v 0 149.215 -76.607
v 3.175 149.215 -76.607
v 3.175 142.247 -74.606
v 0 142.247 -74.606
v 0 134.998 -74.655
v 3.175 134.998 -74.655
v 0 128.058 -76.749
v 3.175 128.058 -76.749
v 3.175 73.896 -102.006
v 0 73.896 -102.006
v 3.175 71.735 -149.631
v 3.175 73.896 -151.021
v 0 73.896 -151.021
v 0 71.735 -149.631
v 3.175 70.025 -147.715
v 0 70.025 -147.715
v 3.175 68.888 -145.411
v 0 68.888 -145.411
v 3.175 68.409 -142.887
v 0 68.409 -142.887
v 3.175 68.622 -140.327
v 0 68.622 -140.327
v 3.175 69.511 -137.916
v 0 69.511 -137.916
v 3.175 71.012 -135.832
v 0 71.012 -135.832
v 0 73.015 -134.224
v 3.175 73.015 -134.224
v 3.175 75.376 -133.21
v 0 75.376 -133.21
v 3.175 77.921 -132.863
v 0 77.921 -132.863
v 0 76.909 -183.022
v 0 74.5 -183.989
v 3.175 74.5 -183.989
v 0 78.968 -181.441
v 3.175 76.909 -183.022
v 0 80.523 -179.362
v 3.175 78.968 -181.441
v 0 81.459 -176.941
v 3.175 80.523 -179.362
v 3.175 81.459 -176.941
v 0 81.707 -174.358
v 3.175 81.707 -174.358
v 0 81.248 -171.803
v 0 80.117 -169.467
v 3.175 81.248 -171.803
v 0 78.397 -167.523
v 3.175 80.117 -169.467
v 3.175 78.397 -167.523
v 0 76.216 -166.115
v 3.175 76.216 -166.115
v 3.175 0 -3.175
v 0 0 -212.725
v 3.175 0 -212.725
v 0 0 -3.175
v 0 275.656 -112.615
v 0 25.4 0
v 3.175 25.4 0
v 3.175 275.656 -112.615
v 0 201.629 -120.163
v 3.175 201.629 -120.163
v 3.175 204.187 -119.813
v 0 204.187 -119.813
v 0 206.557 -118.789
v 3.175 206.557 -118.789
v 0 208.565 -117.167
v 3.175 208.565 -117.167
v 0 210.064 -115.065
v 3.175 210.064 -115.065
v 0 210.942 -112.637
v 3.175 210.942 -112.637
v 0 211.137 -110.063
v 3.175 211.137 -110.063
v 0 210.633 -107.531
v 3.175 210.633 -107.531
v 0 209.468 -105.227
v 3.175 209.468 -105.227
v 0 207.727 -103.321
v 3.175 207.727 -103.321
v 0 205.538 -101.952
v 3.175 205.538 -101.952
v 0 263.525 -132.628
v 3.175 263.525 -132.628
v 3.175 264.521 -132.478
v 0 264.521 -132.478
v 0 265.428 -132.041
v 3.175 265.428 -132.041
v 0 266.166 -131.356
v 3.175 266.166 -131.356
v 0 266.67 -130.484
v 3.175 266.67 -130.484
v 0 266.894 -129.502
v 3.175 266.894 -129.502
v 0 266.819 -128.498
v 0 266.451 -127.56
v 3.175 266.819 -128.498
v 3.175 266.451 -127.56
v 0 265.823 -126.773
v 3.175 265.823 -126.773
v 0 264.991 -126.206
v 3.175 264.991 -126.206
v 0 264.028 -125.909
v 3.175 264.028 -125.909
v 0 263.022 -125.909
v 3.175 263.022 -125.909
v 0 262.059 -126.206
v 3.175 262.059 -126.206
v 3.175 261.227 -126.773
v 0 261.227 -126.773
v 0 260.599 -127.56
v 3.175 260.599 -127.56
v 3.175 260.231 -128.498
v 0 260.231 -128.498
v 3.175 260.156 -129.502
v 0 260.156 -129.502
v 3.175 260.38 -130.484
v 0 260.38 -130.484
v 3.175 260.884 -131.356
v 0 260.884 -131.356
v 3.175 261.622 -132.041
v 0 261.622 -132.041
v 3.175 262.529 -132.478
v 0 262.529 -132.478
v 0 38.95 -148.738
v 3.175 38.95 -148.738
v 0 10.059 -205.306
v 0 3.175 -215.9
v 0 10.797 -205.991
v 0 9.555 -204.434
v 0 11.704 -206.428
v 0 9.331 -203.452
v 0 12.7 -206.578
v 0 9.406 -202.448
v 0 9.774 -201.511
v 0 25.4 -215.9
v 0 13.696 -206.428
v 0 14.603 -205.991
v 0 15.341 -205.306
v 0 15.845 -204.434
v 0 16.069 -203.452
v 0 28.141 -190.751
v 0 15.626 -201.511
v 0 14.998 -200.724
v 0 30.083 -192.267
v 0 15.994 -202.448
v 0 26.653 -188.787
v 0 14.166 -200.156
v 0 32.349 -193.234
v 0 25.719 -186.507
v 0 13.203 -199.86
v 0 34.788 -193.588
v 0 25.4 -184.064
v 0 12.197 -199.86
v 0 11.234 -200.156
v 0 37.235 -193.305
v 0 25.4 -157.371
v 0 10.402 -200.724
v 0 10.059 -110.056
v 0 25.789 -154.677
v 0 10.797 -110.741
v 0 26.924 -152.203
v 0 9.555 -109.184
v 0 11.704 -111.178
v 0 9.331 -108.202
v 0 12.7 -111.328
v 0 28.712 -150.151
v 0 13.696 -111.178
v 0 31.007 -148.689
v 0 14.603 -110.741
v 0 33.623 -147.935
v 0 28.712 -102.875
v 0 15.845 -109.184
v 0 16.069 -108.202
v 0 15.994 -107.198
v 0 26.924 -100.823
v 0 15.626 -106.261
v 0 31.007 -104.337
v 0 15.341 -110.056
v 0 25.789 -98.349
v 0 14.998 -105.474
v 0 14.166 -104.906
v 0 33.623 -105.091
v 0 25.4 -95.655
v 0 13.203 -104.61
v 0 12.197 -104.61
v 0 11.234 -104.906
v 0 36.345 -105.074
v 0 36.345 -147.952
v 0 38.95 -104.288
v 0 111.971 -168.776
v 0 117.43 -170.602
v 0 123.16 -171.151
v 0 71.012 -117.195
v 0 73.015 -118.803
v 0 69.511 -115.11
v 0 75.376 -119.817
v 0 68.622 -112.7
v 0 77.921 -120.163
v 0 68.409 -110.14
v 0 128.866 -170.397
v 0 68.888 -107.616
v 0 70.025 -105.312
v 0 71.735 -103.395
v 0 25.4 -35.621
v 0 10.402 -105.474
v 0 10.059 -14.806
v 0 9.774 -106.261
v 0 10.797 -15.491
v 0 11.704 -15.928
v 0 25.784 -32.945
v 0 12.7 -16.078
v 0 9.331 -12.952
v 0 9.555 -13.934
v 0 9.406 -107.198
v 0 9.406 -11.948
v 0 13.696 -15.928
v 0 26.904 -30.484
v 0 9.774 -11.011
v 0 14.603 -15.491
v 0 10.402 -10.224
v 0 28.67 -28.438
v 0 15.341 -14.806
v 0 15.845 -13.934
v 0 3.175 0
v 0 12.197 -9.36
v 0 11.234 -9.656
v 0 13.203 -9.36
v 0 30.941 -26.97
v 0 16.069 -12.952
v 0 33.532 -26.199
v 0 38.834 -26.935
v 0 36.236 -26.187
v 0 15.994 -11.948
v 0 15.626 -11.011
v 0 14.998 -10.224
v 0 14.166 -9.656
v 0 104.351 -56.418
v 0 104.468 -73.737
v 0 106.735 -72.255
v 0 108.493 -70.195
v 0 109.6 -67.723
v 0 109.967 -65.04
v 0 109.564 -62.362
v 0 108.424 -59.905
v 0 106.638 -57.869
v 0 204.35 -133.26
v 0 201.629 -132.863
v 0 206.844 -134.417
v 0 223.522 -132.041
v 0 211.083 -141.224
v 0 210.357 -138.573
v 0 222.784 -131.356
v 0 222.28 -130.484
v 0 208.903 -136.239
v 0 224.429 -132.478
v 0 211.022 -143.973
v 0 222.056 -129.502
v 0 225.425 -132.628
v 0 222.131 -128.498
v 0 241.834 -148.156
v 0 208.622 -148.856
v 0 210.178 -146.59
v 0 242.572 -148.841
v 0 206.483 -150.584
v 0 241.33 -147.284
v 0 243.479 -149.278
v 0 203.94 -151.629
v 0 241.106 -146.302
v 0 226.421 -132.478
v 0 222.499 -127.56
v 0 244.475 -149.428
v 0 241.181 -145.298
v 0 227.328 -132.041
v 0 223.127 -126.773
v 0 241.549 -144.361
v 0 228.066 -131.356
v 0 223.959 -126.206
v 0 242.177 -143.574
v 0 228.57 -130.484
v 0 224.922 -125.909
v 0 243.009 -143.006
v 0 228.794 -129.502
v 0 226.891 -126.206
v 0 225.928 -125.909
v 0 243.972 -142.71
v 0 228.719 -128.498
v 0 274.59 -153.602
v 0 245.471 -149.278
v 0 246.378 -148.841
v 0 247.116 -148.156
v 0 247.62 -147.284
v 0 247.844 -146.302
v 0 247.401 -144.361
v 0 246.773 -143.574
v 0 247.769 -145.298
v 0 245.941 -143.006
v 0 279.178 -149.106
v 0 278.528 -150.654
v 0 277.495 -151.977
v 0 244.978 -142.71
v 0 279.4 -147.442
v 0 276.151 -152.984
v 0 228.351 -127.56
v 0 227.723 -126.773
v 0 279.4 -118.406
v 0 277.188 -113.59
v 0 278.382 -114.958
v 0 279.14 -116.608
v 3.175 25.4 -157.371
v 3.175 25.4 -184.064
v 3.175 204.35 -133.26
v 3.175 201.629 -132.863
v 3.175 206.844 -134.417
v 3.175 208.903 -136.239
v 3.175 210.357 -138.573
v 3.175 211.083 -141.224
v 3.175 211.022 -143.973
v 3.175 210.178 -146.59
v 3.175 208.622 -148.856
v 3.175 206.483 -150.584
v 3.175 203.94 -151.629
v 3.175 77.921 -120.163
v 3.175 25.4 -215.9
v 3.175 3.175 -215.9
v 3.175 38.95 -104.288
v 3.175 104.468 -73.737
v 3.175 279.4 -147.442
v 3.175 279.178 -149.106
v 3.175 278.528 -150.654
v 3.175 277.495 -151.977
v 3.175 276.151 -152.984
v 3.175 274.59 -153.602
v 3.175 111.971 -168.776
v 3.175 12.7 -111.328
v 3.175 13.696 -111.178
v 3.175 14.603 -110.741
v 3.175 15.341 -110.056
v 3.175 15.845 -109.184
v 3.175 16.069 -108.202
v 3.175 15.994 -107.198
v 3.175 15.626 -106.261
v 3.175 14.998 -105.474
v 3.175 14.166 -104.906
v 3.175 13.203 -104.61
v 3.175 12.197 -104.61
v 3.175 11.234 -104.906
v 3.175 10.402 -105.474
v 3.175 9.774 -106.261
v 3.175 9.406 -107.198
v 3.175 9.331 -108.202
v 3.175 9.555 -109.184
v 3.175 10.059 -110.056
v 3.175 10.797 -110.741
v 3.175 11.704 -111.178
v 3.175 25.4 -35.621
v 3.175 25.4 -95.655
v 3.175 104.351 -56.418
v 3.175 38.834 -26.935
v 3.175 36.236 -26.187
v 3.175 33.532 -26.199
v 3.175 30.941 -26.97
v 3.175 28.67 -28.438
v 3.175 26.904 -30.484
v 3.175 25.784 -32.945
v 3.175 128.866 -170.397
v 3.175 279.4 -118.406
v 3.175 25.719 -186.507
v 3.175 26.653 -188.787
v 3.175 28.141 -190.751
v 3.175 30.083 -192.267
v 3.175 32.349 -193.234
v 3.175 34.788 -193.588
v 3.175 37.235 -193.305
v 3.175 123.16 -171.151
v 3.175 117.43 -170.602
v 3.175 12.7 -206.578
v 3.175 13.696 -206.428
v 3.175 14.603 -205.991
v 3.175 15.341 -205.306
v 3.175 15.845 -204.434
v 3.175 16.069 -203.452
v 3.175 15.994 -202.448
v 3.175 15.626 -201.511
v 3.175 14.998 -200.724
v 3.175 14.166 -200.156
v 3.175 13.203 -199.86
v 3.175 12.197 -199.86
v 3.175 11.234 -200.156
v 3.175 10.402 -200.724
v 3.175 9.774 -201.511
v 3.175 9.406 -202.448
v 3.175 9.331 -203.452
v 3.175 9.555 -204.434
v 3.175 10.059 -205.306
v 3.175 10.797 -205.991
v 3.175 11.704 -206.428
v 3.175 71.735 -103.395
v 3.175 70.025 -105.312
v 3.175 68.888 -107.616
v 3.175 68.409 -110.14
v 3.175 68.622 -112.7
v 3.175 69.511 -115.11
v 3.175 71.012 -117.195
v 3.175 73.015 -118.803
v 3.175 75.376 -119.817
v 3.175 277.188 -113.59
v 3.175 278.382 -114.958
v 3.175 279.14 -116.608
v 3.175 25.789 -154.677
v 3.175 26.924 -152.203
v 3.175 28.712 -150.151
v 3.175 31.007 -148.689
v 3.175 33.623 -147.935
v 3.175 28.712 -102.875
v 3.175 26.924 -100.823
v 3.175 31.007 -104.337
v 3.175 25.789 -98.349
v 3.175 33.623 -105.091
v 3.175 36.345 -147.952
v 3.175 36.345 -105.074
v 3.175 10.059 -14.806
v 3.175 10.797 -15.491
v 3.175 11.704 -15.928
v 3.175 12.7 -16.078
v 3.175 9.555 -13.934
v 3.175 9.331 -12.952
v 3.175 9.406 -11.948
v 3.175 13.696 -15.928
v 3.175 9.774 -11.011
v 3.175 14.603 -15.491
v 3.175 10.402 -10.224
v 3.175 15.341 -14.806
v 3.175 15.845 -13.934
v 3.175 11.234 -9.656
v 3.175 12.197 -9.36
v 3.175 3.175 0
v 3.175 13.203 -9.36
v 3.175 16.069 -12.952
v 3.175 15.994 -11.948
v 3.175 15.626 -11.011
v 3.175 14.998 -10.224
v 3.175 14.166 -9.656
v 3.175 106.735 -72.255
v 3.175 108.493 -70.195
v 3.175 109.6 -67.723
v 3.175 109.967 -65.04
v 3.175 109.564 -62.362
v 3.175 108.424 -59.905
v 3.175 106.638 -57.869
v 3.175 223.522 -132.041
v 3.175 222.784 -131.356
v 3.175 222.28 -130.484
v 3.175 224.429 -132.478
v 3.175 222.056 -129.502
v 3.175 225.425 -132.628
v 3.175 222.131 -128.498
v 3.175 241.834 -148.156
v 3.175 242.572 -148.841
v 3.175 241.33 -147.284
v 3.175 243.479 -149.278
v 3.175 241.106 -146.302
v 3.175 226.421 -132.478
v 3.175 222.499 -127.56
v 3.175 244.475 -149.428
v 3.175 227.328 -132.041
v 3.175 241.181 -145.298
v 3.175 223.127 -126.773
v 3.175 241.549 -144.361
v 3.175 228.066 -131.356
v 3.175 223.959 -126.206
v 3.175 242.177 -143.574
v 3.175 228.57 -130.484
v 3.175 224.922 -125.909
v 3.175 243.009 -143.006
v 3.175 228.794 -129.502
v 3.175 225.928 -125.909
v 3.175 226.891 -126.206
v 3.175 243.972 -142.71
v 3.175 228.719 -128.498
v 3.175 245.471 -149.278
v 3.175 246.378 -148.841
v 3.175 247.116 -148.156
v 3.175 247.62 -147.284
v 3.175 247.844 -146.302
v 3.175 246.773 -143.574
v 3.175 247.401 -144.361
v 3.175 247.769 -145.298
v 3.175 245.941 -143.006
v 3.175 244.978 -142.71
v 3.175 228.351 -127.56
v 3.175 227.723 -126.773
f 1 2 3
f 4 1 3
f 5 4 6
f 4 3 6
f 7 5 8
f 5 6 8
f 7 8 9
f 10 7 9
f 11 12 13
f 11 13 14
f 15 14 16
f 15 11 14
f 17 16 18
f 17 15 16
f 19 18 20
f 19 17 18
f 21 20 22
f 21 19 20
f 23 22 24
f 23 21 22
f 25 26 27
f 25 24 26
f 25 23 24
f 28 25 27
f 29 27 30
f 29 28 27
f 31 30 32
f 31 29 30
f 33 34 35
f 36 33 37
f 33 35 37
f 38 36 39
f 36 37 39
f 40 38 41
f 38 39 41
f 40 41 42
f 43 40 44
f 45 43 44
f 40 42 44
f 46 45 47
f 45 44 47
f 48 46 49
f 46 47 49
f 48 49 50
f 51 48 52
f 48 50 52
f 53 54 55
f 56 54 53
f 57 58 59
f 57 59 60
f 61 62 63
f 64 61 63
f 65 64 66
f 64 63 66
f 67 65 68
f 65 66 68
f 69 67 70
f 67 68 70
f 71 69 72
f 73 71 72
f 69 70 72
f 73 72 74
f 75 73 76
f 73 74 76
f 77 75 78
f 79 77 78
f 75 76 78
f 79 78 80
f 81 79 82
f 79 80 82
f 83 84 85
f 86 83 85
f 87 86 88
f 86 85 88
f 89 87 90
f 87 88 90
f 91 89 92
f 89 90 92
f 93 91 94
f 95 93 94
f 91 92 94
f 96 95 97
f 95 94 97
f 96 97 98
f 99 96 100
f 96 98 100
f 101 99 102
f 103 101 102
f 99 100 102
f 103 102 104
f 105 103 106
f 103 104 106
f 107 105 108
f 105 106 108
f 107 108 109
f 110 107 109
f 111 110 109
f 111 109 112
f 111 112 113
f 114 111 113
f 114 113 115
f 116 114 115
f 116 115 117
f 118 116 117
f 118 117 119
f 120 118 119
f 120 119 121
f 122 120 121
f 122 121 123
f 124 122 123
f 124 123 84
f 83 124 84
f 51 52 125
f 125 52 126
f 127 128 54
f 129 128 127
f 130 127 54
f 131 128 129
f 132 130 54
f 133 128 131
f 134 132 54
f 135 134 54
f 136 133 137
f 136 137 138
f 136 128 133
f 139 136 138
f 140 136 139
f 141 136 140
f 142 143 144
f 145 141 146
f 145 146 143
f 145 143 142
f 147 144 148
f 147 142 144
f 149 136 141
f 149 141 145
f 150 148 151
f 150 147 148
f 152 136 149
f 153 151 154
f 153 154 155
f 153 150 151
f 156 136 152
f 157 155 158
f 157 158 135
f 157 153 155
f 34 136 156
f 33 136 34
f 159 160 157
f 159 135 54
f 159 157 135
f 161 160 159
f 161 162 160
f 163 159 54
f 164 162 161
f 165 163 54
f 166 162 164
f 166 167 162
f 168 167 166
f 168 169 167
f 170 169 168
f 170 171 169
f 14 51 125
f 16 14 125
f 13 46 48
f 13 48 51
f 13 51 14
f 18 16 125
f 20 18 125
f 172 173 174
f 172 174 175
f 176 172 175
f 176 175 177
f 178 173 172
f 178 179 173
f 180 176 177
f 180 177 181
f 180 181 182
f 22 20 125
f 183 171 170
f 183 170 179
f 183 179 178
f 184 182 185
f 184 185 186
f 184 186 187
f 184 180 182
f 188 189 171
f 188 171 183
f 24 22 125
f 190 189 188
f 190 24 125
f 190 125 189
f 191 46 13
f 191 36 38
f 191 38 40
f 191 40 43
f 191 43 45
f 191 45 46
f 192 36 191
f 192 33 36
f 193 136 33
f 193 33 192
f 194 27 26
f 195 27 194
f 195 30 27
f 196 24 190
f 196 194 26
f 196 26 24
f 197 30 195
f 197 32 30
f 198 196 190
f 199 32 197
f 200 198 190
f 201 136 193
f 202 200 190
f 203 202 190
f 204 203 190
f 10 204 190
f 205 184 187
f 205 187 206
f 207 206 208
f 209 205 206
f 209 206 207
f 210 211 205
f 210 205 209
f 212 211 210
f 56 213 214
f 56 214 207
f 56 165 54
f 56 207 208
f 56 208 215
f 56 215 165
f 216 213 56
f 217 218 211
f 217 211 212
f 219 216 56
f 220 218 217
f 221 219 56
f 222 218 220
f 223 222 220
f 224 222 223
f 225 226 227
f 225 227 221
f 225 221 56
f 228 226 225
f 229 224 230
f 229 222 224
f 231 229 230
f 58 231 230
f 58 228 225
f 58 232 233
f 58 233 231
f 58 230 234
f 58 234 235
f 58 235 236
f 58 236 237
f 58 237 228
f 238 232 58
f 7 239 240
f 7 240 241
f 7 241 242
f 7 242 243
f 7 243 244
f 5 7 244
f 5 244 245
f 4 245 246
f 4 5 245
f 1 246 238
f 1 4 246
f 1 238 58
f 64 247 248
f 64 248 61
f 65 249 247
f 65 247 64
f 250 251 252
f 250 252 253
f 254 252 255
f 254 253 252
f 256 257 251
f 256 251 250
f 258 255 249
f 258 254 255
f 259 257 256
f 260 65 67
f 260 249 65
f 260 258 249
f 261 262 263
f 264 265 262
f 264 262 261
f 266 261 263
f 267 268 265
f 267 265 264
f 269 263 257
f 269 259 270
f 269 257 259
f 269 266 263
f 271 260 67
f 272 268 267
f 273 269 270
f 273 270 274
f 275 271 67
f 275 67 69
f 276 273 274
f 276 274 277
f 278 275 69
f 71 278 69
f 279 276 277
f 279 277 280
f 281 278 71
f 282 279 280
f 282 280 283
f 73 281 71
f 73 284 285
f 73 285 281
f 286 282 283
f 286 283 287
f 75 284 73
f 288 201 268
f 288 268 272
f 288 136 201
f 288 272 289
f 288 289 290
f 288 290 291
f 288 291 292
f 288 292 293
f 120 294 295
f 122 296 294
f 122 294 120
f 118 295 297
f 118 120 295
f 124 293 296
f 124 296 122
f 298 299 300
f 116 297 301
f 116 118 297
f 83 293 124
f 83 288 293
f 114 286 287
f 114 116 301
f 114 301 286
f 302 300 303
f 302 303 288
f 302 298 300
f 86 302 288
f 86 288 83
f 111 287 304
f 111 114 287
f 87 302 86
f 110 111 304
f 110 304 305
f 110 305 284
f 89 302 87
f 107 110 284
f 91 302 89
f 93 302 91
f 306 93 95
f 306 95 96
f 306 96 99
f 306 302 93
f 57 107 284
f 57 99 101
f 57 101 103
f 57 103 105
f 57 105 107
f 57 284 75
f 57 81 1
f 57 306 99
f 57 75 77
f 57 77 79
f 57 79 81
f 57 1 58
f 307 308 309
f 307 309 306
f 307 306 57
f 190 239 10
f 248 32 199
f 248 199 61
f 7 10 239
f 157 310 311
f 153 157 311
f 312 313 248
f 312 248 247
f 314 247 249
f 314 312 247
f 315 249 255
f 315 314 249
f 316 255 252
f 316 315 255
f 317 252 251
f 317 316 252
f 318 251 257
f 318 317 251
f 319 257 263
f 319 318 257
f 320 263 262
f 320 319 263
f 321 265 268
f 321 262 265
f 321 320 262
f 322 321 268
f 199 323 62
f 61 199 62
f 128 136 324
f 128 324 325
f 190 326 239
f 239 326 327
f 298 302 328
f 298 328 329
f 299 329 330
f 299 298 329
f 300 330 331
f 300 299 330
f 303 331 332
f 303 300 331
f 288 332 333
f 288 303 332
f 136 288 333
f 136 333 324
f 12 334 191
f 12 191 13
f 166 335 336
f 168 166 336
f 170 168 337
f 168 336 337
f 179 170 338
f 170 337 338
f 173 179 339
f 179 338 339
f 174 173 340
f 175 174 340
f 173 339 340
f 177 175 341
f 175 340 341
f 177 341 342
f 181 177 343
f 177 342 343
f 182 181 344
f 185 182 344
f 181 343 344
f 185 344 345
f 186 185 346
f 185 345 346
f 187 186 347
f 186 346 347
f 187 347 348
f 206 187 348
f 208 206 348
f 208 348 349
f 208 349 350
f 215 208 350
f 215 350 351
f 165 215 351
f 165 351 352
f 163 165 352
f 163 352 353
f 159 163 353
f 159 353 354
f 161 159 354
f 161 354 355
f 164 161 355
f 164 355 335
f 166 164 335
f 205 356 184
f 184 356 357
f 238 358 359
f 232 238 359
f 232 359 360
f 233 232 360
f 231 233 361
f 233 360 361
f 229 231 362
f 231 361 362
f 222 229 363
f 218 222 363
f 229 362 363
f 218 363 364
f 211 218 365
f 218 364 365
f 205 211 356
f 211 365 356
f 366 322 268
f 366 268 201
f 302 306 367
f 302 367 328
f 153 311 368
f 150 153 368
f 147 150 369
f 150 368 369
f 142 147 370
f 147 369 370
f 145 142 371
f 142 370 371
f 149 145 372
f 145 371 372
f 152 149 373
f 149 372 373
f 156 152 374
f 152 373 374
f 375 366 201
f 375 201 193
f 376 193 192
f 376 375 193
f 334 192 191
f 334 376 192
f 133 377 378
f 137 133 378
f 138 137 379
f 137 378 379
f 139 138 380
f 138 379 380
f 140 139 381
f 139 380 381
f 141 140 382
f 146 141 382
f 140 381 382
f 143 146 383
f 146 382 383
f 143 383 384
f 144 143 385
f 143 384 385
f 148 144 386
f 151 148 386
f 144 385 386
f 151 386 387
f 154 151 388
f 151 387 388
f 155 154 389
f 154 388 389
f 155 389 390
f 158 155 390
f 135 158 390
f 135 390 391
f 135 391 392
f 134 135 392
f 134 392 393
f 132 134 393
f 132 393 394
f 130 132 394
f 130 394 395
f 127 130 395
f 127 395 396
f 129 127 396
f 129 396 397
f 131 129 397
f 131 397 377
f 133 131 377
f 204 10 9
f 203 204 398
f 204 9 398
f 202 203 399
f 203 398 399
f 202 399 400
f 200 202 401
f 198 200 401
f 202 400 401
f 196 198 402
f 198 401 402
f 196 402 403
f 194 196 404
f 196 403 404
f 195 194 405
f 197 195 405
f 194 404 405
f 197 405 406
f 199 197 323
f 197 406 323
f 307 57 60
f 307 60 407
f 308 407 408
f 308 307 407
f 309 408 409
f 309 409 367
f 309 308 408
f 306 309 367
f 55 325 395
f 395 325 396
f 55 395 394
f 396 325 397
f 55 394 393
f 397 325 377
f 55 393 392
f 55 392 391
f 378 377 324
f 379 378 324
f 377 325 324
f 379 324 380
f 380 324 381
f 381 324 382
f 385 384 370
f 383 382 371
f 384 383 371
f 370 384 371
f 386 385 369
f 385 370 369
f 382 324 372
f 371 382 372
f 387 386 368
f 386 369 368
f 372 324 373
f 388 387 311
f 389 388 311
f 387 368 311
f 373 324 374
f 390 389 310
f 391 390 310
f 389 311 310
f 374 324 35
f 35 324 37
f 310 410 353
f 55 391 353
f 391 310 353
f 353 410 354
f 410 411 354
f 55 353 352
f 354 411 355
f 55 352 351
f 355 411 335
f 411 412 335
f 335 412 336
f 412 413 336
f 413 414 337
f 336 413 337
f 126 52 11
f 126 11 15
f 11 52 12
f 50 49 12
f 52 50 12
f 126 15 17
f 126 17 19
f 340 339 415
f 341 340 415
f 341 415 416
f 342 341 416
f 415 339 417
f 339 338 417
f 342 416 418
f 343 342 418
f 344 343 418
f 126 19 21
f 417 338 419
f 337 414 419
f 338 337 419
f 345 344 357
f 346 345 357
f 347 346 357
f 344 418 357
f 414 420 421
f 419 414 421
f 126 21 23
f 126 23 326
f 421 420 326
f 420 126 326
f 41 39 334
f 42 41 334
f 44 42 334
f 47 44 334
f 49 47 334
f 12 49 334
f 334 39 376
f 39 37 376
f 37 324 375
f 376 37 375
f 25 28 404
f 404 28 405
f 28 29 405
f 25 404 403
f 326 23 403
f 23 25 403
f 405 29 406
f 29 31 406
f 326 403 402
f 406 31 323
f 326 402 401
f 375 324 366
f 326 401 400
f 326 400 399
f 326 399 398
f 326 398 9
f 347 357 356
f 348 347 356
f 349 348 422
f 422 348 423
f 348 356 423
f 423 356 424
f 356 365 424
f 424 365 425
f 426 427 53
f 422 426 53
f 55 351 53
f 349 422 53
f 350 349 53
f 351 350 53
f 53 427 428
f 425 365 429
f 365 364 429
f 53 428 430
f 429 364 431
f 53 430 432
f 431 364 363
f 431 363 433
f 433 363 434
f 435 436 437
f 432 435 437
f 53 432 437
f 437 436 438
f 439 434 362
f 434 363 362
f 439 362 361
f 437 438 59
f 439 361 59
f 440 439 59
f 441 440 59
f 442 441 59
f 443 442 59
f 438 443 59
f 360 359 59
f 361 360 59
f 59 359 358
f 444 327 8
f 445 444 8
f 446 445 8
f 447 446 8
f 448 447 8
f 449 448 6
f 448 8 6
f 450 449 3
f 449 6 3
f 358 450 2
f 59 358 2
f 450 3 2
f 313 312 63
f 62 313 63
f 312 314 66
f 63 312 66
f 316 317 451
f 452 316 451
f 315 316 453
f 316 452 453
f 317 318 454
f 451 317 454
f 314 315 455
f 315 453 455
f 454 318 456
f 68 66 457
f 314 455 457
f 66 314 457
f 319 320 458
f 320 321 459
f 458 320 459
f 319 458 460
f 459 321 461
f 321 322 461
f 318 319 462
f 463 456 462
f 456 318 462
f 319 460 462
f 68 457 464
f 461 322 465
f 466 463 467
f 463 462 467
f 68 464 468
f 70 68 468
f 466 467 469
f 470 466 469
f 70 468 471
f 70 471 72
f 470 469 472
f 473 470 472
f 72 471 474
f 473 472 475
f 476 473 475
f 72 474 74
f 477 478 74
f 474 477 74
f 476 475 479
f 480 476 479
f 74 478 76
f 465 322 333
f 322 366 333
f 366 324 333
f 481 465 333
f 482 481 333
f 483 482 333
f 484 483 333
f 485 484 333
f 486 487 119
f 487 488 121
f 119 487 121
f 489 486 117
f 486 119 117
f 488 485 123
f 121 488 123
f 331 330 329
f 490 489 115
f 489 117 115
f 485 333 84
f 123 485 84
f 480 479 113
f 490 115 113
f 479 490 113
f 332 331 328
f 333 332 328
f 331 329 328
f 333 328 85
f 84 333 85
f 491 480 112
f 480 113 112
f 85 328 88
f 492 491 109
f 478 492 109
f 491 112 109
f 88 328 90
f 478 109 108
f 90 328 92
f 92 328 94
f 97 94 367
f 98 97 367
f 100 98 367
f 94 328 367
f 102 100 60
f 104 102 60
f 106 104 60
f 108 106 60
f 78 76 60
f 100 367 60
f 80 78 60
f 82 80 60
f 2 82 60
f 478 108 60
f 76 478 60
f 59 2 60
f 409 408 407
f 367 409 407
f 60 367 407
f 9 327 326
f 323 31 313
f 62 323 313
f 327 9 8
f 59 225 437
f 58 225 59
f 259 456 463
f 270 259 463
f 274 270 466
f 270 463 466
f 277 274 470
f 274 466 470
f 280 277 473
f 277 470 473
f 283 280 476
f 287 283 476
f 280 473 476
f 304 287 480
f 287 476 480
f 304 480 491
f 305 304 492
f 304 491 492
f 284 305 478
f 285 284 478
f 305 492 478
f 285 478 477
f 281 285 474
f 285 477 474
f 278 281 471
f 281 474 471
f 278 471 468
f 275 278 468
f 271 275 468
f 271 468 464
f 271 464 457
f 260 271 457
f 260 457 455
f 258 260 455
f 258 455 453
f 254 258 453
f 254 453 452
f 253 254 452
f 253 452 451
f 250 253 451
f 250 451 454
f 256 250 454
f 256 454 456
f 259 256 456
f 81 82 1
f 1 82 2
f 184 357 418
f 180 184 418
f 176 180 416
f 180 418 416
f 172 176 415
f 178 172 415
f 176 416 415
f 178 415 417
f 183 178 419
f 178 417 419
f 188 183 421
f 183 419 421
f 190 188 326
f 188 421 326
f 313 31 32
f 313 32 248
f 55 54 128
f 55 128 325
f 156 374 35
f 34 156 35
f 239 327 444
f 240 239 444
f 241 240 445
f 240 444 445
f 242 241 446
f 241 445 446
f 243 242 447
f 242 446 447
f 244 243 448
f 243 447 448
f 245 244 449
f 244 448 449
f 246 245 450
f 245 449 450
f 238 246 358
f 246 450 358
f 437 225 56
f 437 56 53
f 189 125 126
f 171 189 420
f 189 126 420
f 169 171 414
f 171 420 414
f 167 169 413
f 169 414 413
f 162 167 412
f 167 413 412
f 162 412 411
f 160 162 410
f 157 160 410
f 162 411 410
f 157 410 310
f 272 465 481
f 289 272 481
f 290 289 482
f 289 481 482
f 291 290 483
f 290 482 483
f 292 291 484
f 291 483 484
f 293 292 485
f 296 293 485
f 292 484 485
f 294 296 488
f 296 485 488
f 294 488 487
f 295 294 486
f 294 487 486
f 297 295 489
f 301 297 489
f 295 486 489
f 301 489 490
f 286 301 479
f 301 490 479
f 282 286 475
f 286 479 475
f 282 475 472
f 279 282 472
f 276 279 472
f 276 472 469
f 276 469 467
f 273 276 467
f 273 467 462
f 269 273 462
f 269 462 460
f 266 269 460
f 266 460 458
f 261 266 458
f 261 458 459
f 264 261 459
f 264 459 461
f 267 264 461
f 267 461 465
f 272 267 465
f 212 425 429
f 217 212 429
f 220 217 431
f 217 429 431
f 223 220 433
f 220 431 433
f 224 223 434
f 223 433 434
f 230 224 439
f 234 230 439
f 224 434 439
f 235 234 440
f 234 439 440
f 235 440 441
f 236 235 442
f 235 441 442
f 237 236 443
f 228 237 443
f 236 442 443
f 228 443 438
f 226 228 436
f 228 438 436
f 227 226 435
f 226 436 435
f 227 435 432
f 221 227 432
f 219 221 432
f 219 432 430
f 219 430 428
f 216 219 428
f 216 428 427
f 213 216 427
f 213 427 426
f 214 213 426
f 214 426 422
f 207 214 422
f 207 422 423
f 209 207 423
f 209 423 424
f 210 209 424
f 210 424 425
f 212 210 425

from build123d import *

# Parameters (mm, degrees)
BOSS_EXTRUDE1_DEPTH = 3.175
SKETCH3_R           = 3.3782
CUT_EXTRUDE2_DEPTH  = 4.175
SKETCH4_R           = 3.3782
CUT_EXTRUDE3_DEPTH  = 4.175
CHAMFER1_SIZE       = 3.175
CUT_EXTRUDE4_DEPTH  = 4.175


with BuildPart() as part:
    # Sketch1 → Boss-Extrude1 (new body)
    with BuildSketch(Plane(origin=(0, 0, 0), x_dir=(0, 0, -1), z_dir=(1, 0, 0))):
        with BuildLine():
            Line((118.405818623, 279.4), (147.442069819, 279.4))
            ThreePointArc((147.442069819, 279.4), (151.349937349, 278.055104531), (153.602474695, 274.590101219))
            Line((153.602474695, 274.590101219), (215.9, 25.4))
            Line((215.9, 25.4), (215.9, 0))
            Line((215.9, 0), (0, 0))
            Line((0, 0), (0, 25.4))
            Line((0, 25.4), (112.615117065, 275.655815701))
            ThreePointArc((112.615117065, 275.655815701), (114.95795187, 278.382421106), (118.405818623, 279.4))
        make_face()
    extrude(amount=BOSS_EXTRUDE1_DEPTH)

    # Sketch3 → Cut-Extrude2 (cut, through all)
    with BuildSketch(Plane(origin=(3.175, 0, 0), x_dir=(0, 0, -1), z_dir=(1, 0, 0))):
        with Locations((146.05, 244.475)):
            Circle(SKETCH3_R)
        with Locations((129.249479175, 225.425)):
            Circle(SKETCH3_R)
        with Locations((129.249479175, 263.525)):
            Circle(SKETCH3_R)
    extrude(amount=-CUT_EXTRUDE2_DEPTH, mode=Mode.SUBTRACT)

    # Sketch4 → Cut-Extrude3 (cut, through all)
    with BuildSketch(Plane(origin=(3.175, 0, 0), x_dir=(0, 0, -1), z_dir=(1, 0, 0))):
        with Locations((12.7, 12.7)):
            Circle(SKETCH4_R)
        with Locations((107.95, 12.7)):
            Circle(SKETCH4_R)
        with Locations((203.2, 12.7)):
            Circle(SKETCH4_R)
    extrude(amount=-CUT_EXTRUDE3_DEPTH, mode=Mode.SUBTRACT)

    # Chamfer1
    chamfer1_edges = [part.edges().sort_by_distance(p)[0] for p in [
        (1.5875, 0, -215.9),
        (1.5875, 0, 0),
    ]]
    chamfer(chamfer1_edges, length=CHAMFER1_SIZE)

    # Sketch5 → Cut-Extrude4 (cut, through all)
    with BuildSketch(Plane(origin=(3.175, 0, 0), x_dir=(0, 0, -1), z_dir=(1, 0, 0))):
        with BuildLine():
            Line((35.621183805, 25.4), (95.655352116, 25.4))
            ThreePointArc((95.655352116, 25.4), (103.688655638, 29.80722123), (104.287933788, 38.950438943))
            Line((104.287933788, 38.950438943), (73.736631302, 104.467918555))
            ThreePointArc((73.736631302, 104.467918555), (65.039859299, 109.967263315), (56.417997293, 104.351203163))
            Line((56.417997293, 104.351203163), (26.935131468, 38.833723552))
            ThreePointArc((26.935131468, 38.833723552), (27.622552146, 29.75319987), (35.621183805, 25.4))
        make_face()
        with BuildLine():
            Line((101.952143857, 205.538195526), (76.606881892, 149.21539116))
            ThreePointArc((76.606881892, 149.21539116), (74.370264914, 138.620954139), (76.749470333, 128.057624508))
            Line((76.749470333, 128.057624508), (102.005614522, 73.895648509))
            ThreePointArc((102.005614522, 73.895648509), (112.699783516, 68.621867985), (120.163196193, 77.921087453))
            Line((120.163196193, 77.921087453), (120.163196193, 201.629471974))
            ThreePointArc((120.163196193, 201.629471974), (112.637067937, 210.942373603), (101.952143857, 205.538195526))
        make_face()
        with BuildLine():
            Line((151.628803507, 203.939623803), (170.39715385, 128.866222433))
            ThreePointArc((170.39715385, 128.866222433), (171.039366508, 120.279332191), (168.775752137, 111.971313709))
            Line((168.775752137, 111.971313709), (151.020777865, 73.895648509))
            ThreePointArc((151.020777865, 73.895648509), (140.326608871, 68.621867985), (132.863196193, 77.921087453))
            Line((132.863196193, 77.921087453), (132.863196193, 201.629471974))
            ThreePointArc((132.863196193, 201.629471974), (141.224400607, 211.083106452), (151.628803507, 203.939623803))
        make_face()
        with BuildLine():
            Line((157.371040271, 25.4), (184.064314187, 25.4))
            ThreePointArc((184.064314187, 25.4), (191.571970984, 29.063198705), (193.304921501, 37.235151828))
            Line((193.304921501, 37.235151828), (183.988647407, 74.500248205))
            ThreePointArc((183.988647407, 74.500248205), (175.657972105, 81.671533437), (166.115458421, 76.21553532))
            Line((166.115458421, 76.21553532), (148.738458599, 38.950438943))
            ThreePointArc((148.738458599, 38.950438943), (149.337736749, 29.80722123), (157.371040271, 25.4))
        make_face()
    extrude(amount=-CUT_EXTRUDE4_DEPTH, mode=Mode.SUBTRACT)


solid = part.part
